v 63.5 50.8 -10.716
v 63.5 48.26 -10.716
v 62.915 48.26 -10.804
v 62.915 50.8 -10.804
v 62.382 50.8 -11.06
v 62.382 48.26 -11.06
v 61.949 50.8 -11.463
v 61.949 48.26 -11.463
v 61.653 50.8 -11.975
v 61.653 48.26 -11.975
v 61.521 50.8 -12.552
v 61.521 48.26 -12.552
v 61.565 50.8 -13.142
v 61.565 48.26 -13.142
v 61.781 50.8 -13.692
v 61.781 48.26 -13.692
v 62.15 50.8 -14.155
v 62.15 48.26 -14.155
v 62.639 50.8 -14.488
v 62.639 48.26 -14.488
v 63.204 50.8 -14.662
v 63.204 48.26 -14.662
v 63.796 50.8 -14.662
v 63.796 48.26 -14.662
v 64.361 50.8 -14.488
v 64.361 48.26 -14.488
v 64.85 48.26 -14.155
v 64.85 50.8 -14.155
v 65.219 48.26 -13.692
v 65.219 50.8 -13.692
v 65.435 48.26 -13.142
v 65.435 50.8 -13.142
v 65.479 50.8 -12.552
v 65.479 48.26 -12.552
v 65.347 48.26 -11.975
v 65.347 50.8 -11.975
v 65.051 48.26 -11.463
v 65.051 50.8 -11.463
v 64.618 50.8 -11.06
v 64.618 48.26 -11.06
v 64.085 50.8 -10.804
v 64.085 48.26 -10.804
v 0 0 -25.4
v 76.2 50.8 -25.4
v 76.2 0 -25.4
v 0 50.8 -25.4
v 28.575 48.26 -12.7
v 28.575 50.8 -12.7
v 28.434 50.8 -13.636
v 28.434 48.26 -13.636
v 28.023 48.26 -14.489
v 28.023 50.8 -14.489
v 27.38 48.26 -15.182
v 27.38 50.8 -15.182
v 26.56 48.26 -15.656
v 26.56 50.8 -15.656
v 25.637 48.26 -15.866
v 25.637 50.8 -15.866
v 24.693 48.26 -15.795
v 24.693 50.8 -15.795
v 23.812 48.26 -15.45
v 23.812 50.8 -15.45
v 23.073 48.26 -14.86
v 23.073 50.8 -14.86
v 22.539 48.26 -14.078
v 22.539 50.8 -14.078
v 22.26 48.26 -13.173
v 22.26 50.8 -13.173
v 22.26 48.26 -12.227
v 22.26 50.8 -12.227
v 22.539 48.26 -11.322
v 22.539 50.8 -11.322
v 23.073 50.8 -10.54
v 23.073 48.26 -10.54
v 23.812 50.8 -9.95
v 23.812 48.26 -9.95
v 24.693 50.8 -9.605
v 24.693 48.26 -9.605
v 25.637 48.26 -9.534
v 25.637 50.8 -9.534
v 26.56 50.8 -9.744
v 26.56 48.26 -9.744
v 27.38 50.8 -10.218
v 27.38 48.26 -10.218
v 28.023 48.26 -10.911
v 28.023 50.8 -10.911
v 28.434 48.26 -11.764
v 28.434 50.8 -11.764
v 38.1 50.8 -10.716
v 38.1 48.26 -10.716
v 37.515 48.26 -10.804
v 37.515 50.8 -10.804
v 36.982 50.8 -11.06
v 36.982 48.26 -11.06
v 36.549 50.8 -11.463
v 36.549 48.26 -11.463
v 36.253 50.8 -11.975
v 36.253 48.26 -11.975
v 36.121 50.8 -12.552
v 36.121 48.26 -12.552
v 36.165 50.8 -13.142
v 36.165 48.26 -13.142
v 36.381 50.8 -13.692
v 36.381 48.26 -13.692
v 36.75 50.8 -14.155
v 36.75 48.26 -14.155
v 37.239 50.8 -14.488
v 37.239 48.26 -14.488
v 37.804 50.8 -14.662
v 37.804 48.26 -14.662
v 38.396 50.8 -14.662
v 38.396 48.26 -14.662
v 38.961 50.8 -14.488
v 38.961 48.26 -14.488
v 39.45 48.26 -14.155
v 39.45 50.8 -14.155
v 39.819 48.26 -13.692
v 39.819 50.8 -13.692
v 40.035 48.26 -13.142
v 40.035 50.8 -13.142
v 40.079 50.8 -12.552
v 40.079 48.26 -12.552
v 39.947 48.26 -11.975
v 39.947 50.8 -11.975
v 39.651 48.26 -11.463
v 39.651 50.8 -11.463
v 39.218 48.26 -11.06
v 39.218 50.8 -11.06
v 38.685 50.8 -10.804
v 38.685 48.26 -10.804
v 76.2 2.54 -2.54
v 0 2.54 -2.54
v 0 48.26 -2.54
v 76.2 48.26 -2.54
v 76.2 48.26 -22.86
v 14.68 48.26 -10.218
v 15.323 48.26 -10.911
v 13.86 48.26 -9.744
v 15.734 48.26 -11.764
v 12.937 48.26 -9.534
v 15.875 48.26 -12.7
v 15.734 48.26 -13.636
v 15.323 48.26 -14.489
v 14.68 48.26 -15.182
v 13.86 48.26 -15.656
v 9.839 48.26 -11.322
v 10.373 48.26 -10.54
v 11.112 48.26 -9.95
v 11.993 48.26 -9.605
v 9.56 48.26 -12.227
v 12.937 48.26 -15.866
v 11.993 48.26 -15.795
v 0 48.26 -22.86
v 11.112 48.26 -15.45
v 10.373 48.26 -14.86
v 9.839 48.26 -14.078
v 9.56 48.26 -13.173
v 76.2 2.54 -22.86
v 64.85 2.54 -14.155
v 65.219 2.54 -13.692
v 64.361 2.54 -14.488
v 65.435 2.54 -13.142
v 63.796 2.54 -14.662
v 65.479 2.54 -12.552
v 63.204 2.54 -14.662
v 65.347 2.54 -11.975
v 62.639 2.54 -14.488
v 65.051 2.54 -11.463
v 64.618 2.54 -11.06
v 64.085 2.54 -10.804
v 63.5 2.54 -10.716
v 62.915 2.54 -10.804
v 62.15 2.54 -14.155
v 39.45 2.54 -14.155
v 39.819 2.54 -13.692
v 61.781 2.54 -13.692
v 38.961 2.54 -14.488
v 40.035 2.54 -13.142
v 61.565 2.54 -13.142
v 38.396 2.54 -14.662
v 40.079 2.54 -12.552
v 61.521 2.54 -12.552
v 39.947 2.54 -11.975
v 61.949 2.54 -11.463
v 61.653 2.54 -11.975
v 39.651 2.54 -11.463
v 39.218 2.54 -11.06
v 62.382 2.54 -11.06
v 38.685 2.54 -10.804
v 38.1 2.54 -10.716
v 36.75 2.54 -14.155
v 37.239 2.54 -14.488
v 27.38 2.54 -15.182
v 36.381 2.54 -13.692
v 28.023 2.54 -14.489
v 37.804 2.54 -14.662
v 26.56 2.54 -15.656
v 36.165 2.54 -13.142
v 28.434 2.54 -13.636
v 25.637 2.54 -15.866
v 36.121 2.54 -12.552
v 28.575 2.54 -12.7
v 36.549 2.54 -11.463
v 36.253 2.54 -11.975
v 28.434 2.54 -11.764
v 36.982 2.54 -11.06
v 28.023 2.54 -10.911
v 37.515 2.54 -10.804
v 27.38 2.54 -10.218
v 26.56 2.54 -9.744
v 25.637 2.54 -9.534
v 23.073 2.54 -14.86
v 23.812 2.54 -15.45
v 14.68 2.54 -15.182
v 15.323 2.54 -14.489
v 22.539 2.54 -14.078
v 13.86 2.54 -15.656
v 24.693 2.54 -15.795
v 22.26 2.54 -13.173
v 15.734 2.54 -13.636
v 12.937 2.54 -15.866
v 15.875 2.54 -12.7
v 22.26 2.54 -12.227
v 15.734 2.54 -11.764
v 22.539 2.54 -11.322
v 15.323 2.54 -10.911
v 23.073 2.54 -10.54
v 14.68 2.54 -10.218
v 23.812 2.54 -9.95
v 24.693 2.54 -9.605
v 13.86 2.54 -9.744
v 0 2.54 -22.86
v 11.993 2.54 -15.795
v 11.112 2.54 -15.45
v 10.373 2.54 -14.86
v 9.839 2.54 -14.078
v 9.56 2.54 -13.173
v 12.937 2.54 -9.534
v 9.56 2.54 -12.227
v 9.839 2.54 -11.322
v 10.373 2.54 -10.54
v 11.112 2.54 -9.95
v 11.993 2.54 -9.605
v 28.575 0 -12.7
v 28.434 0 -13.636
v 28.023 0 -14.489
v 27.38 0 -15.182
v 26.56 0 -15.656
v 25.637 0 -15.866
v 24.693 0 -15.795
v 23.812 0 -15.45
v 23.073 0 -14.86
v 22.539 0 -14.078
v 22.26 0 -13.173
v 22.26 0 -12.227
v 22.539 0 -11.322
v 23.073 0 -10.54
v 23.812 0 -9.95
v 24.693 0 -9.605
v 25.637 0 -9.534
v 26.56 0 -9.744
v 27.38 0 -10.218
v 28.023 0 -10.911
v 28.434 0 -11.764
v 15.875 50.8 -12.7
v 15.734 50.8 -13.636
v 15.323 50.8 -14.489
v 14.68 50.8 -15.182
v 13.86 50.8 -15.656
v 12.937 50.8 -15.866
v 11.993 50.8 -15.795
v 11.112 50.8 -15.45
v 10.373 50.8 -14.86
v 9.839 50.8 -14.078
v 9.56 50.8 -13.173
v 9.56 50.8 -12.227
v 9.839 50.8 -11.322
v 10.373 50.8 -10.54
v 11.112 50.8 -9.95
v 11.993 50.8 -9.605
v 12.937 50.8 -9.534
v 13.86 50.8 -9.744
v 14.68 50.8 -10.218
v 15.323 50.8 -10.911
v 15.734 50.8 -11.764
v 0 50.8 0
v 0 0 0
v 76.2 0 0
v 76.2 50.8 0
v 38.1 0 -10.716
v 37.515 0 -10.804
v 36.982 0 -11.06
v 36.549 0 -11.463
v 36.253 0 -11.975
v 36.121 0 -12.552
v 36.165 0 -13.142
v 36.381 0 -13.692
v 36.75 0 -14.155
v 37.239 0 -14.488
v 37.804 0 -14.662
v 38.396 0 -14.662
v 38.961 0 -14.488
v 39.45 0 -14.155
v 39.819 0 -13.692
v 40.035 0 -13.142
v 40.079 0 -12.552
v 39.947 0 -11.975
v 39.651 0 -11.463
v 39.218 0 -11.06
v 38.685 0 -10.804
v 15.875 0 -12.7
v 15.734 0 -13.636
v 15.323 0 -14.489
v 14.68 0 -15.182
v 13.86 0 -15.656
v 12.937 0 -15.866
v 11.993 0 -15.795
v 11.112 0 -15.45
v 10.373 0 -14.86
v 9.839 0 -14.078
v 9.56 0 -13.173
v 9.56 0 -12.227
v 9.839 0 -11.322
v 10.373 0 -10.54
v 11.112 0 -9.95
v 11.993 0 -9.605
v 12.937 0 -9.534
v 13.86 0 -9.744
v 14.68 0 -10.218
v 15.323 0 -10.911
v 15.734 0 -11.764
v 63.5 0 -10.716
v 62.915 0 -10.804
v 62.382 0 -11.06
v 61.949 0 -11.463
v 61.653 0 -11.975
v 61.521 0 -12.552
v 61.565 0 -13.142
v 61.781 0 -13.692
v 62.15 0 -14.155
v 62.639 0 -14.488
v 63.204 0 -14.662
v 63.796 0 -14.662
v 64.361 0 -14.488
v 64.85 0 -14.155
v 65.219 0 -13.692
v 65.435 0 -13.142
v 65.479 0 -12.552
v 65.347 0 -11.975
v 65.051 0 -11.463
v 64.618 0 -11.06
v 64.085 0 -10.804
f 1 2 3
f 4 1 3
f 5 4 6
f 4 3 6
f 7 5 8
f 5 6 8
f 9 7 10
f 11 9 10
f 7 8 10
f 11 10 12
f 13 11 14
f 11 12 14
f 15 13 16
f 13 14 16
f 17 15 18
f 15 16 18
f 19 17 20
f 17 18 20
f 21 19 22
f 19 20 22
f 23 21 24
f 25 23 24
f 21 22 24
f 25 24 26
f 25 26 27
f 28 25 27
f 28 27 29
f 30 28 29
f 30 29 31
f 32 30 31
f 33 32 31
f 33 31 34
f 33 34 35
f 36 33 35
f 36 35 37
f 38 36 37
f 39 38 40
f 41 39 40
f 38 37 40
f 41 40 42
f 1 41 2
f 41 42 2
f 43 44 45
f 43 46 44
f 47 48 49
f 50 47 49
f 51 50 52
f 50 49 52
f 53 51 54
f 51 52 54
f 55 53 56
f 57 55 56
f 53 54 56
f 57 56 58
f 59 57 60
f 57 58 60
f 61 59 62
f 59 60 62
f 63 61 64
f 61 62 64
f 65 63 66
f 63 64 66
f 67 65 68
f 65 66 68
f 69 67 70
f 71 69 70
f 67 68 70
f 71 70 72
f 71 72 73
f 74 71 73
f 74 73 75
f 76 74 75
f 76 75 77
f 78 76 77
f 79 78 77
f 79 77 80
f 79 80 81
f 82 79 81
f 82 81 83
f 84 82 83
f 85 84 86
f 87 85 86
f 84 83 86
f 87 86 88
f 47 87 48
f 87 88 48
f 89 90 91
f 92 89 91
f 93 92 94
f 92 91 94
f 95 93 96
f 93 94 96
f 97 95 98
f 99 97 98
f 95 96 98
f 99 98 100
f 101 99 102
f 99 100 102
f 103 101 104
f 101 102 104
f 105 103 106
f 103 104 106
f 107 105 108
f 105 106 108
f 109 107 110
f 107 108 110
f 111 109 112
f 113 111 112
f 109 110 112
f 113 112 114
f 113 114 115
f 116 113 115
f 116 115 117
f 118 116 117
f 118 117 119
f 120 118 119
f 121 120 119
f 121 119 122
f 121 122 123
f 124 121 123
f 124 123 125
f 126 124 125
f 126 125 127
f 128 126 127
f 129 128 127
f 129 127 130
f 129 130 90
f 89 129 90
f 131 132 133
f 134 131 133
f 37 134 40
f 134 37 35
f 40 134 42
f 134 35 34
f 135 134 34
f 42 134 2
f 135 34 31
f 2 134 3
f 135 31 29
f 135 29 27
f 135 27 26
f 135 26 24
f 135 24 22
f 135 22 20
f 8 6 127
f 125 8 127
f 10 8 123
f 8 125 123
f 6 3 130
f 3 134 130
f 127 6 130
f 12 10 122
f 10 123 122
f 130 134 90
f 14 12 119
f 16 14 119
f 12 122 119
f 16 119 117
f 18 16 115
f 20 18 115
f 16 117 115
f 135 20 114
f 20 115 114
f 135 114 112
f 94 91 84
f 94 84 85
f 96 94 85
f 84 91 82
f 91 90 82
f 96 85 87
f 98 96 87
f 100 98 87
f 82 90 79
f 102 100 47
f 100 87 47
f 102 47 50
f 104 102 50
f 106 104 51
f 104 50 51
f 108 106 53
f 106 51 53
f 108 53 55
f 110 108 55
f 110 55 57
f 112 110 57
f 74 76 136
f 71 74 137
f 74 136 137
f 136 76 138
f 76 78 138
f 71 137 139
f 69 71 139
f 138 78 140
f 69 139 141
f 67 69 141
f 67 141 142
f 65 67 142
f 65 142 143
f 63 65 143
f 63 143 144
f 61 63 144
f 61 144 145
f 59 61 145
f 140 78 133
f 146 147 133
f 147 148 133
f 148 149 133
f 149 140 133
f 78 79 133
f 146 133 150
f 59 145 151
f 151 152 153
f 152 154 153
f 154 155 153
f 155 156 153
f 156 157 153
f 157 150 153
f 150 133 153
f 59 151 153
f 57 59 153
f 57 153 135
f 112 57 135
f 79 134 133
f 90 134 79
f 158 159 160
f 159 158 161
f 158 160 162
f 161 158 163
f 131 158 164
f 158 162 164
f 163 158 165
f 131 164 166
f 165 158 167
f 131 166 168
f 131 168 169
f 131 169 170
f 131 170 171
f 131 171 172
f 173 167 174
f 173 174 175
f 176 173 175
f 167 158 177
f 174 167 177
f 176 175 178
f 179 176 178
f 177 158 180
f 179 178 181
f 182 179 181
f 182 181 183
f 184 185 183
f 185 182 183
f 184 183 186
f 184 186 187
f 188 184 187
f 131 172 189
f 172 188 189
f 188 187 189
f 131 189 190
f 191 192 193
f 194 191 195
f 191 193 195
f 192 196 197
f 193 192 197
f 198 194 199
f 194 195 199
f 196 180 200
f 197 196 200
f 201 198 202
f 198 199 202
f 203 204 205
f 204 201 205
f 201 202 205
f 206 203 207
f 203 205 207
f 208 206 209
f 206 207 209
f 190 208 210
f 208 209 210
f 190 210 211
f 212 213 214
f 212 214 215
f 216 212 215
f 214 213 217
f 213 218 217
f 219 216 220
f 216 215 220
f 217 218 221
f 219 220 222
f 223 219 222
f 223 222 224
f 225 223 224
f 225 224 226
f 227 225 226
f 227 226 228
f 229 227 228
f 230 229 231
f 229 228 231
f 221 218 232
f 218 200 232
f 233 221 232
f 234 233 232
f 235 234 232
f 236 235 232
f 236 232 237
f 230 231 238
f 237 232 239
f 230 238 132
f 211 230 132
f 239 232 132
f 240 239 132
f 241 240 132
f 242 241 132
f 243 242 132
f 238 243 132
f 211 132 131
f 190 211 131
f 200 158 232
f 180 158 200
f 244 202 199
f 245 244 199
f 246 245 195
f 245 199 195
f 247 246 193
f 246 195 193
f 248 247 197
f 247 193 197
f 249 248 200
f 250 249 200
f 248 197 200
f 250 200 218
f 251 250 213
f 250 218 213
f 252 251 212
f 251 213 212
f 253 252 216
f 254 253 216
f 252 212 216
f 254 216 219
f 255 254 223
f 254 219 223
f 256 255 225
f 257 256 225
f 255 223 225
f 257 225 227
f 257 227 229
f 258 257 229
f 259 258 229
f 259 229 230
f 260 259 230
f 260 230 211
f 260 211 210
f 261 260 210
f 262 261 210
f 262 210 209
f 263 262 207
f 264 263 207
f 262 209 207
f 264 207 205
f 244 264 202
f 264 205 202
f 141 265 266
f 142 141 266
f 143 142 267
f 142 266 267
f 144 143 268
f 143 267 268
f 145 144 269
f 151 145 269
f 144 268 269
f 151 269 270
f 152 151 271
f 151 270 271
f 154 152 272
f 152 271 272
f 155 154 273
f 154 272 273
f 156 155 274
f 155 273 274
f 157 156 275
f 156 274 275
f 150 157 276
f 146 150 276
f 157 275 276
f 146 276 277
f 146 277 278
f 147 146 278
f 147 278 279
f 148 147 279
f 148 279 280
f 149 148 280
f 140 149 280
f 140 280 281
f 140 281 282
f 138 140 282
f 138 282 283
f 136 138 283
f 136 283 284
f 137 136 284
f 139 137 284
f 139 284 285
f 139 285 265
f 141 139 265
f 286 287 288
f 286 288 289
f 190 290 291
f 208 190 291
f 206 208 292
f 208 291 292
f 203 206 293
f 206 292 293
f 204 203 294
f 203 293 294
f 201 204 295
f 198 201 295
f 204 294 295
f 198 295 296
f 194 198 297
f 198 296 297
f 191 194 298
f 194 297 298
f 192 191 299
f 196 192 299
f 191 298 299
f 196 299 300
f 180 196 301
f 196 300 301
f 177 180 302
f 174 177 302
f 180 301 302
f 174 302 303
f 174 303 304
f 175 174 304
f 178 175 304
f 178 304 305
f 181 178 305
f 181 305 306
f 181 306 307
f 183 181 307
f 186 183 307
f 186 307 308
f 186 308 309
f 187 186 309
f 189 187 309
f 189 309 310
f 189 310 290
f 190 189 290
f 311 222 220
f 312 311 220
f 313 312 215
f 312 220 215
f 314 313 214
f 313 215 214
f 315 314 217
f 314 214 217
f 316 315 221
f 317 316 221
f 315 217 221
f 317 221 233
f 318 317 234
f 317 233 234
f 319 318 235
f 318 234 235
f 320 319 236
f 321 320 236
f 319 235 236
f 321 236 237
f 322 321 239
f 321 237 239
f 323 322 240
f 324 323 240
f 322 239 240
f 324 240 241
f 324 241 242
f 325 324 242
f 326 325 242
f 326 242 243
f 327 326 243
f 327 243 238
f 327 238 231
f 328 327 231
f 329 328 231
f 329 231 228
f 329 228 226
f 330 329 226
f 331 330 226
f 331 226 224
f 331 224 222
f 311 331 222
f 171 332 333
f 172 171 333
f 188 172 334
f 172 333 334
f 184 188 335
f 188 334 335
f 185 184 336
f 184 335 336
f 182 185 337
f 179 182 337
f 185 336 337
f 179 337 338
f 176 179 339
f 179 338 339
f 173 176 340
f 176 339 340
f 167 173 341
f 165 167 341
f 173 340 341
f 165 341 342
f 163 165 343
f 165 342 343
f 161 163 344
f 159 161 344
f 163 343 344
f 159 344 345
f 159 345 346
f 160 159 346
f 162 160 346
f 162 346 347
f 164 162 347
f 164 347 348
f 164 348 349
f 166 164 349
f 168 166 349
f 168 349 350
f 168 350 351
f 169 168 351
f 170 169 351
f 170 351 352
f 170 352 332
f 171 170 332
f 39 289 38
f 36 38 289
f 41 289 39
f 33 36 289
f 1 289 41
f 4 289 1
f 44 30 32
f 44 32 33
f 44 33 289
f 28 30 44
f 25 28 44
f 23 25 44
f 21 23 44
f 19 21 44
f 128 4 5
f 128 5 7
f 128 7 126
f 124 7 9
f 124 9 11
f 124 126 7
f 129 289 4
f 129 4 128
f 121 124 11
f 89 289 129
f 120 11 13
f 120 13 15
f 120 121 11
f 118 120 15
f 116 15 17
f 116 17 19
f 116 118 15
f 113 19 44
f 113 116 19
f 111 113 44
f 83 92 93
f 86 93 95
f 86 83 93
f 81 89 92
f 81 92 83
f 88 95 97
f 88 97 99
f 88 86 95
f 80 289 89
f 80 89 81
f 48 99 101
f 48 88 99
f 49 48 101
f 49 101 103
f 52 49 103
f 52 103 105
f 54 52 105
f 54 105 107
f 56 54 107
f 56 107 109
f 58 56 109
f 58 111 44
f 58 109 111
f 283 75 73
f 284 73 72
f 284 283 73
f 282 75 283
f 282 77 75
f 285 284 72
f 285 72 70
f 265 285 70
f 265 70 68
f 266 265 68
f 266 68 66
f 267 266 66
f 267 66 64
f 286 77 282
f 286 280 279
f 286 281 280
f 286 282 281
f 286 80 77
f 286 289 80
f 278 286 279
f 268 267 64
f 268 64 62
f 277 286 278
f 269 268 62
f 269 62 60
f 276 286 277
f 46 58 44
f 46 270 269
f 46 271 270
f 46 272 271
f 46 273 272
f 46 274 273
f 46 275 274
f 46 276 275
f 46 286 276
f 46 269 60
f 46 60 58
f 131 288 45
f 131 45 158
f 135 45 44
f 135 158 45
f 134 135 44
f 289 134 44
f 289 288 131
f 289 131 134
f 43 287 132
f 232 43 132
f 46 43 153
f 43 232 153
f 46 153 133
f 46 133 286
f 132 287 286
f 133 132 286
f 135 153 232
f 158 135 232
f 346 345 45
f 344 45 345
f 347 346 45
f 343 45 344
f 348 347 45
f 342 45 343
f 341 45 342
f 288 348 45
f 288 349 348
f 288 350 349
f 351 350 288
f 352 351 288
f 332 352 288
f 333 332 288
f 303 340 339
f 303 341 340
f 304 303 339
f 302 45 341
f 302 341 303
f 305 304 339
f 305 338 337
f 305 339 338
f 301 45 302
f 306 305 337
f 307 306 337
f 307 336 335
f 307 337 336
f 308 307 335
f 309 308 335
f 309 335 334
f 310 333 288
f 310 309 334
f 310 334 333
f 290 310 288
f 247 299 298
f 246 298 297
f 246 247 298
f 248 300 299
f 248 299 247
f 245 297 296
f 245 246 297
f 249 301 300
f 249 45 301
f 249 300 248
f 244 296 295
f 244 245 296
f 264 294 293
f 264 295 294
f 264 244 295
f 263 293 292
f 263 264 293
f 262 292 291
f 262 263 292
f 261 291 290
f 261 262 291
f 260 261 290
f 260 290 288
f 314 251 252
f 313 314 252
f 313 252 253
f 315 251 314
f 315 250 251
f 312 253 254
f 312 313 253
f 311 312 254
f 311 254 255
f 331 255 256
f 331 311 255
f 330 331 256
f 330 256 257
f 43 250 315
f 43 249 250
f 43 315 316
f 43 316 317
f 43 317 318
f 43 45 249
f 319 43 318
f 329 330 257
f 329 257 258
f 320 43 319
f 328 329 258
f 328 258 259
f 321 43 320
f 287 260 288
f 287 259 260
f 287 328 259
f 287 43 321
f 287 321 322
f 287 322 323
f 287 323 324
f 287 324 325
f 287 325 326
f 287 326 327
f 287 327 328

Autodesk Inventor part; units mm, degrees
ref_plane "YZ Plane" through (0, 0, 0) normal (1, 0, 0) x (0, 1, 0)
ref_plane "XZ Plane" through (0, 0, 0) normal (0, 1, 0) x (-1, 0, 0)
ref_plane "XY Plane" through (0, 0, 0) normal (0, 0, 1) x (1, 0, 0)
sketch "Sketch1" plane through (0, 0, 0) normal (1, 0, 0) x (0, 1, 0)
  line L0 (0, 0) -> (50.8, 0)
  line L1 (50.8, 0) -> (50.8, -25.4)
  line L2 (50.8, -25.4) -> (0, -25.4)
  line L3 (0, -25.4) -> (0, 0)
  line L4 (2.54, -2.54) -> (48.26, -2.54)
  line L5 (48.26, -2.54) -> (48.26, -22.86)
  line L6 (48.26, -22.86) -> (2.54, -22.86)
  line L7 (2.54, -22.86) -> (2.54, -2.54)
  dimension "d0" = 50.8
  dimension "d1" = 25.4
  dimension "d2" = 45.72
  dimension "d3" = 20.32
  dimension "d4" = 2.54
  dimension "d5" = 2.54
extrude "Extrusion1" add sketch "Sketch1" along normal blind 76.2
sketch "Sketch2" plane through (0, 50.8, 0) normal (0, 1, 0) x (1, 0, 0)
  line L0 (0, 0) -> (0, 25.4) projected
  line L1 (0, 0) -> (76.2, 0) projected
  line L2 (76.2, 25.4) -> (76.2, 0) projected
  line L3 (0, 25.4) -> (76.2, 25.4) projected
  point P0 (12.7, 12.7)
  point P1 (38.1, 12.7)
  point P2 (63.5, 12.7)
  dimension "d8" = 12.7
  dimension "d9" = 12.7
  dimension "d10" = 12.7
  dimension "d11" = 12.7
  dimension "d12" = 38.1
  dimension "d13" = 63.5
hole "Hole1" at (12.7, 50.8, -12.7) at (38.1, 50.8, -12.7) at (63.5, 50.8, -12.7) direction (0, -1, 0) diameter 3.9688 end through all
sketch "Sketch4" plane through (0, 50.8, 0) normal (0, 1, 0) x (1, 0, 0)
  circle A0 centre (38.1, 12.7) radius 1.9844 projected
  circle A1 centre (12.7, 12.7) radius 1.9844 projected
  circle A2 centre (63.5, 12.7) radius 1.9844 projected
  line L0 (0, 0) -> (0, 25.4) projected
  line L1 (0, 0) -> (76.2, 0) projected
  line L2 (76.2, 25.4) -> (76.2, 0) projected
  line L3 (0, 25.4) -> (76.2, 25.4) projected
  circle A3 centre (25.4, 12.7) radius 3.175
  circle A4 centre (12.7, 12.7) radius 3.175
  dimension "d25" = 12.7
  dimension "d26" = 25.4
  dimension "d27" = 6.35
  dimension "d28" = 6.35
extrude "Extrusion3" cut sketch "Sketch4" against normal blind 50.8 contours A3 | A4
properties part number "frame_side"
